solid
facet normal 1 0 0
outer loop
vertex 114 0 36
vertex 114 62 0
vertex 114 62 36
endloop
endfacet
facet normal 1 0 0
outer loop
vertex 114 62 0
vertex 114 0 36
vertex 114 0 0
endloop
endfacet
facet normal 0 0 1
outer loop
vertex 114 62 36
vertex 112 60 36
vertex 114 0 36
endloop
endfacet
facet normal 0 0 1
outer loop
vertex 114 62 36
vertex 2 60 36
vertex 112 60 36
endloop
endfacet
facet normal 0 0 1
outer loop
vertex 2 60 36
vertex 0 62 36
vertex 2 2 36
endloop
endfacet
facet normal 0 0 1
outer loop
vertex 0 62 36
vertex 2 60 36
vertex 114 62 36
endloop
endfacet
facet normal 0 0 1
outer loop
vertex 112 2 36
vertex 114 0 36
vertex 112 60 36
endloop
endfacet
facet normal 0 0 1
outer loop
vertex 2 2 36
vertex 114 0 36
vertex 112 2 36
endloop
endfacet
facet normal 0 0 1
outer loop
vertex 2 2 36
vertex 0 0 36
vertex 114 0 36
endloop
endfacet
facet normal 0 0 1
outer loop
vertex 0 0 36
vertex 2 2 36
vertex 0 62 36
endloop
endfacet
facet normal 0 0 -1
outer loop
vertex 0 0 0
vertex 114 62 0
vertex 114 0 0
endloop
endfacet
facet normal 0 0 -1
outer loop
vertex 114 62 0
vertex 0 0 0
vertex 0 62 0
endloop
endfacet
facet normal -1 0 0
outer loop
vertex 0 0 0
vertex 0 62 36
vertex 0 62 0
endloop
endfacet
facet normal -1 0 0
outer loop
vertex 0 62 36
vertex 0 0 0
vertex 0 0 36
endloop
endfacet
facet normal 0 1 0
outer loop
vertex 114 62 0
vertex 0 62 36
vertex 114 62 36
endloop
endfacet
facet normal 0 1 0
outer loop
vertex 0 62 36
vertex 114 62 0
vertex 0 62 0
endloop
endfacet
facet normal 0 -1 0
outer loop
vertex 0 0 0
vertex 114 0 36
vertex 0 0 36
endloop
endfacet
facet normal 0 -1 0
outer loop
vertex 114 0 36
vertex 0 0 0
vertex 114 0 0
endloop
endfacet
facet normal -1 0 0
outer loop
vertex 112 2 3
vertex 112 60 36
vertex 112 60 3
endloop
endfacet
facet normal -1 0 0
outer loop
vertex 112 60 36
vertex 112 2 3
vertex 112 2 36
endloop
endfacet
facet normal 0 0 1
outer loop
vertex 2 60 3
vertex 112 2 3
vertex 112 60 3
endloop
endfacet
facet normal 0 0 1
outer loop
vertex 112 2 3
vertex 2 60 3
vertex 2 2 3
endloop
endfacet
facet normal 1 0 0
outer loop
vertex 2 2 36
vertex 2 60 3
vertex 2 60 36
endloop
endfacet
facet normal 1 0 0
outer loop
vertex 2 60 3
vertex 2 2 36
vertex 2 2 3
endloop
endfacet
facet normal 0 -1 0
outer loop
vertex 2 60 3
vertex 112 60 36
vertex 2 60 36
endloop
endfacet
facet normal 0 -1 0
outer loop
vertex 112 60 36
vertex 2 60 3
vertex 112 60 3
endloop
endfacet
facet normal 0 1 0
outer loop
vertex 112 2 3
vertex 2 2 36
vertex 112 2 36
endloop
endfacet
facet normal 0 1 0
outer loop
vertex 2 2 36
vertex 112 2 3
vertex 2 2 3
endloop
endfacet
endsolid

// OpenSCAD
$fn = 20;

delka_ven = 114;
sirka_ven = 62;
vyska_ven = 36;

delka_vnit = 110;
sirka_vnit = 58;
vyska_vnit = 33;

module main()
{
    difference()
    {
        cube([delka_ven, sirka_ven, vyska_ven]);
        translate ([(delka_ven - delka_vnit) / 2, (sirka_ven - sirka_vnit) / 2, vyska_ven - vyska_vnit]) cube([delka_vnit, sirka_vnit, vyska_vnit]);
    }
}

main();
